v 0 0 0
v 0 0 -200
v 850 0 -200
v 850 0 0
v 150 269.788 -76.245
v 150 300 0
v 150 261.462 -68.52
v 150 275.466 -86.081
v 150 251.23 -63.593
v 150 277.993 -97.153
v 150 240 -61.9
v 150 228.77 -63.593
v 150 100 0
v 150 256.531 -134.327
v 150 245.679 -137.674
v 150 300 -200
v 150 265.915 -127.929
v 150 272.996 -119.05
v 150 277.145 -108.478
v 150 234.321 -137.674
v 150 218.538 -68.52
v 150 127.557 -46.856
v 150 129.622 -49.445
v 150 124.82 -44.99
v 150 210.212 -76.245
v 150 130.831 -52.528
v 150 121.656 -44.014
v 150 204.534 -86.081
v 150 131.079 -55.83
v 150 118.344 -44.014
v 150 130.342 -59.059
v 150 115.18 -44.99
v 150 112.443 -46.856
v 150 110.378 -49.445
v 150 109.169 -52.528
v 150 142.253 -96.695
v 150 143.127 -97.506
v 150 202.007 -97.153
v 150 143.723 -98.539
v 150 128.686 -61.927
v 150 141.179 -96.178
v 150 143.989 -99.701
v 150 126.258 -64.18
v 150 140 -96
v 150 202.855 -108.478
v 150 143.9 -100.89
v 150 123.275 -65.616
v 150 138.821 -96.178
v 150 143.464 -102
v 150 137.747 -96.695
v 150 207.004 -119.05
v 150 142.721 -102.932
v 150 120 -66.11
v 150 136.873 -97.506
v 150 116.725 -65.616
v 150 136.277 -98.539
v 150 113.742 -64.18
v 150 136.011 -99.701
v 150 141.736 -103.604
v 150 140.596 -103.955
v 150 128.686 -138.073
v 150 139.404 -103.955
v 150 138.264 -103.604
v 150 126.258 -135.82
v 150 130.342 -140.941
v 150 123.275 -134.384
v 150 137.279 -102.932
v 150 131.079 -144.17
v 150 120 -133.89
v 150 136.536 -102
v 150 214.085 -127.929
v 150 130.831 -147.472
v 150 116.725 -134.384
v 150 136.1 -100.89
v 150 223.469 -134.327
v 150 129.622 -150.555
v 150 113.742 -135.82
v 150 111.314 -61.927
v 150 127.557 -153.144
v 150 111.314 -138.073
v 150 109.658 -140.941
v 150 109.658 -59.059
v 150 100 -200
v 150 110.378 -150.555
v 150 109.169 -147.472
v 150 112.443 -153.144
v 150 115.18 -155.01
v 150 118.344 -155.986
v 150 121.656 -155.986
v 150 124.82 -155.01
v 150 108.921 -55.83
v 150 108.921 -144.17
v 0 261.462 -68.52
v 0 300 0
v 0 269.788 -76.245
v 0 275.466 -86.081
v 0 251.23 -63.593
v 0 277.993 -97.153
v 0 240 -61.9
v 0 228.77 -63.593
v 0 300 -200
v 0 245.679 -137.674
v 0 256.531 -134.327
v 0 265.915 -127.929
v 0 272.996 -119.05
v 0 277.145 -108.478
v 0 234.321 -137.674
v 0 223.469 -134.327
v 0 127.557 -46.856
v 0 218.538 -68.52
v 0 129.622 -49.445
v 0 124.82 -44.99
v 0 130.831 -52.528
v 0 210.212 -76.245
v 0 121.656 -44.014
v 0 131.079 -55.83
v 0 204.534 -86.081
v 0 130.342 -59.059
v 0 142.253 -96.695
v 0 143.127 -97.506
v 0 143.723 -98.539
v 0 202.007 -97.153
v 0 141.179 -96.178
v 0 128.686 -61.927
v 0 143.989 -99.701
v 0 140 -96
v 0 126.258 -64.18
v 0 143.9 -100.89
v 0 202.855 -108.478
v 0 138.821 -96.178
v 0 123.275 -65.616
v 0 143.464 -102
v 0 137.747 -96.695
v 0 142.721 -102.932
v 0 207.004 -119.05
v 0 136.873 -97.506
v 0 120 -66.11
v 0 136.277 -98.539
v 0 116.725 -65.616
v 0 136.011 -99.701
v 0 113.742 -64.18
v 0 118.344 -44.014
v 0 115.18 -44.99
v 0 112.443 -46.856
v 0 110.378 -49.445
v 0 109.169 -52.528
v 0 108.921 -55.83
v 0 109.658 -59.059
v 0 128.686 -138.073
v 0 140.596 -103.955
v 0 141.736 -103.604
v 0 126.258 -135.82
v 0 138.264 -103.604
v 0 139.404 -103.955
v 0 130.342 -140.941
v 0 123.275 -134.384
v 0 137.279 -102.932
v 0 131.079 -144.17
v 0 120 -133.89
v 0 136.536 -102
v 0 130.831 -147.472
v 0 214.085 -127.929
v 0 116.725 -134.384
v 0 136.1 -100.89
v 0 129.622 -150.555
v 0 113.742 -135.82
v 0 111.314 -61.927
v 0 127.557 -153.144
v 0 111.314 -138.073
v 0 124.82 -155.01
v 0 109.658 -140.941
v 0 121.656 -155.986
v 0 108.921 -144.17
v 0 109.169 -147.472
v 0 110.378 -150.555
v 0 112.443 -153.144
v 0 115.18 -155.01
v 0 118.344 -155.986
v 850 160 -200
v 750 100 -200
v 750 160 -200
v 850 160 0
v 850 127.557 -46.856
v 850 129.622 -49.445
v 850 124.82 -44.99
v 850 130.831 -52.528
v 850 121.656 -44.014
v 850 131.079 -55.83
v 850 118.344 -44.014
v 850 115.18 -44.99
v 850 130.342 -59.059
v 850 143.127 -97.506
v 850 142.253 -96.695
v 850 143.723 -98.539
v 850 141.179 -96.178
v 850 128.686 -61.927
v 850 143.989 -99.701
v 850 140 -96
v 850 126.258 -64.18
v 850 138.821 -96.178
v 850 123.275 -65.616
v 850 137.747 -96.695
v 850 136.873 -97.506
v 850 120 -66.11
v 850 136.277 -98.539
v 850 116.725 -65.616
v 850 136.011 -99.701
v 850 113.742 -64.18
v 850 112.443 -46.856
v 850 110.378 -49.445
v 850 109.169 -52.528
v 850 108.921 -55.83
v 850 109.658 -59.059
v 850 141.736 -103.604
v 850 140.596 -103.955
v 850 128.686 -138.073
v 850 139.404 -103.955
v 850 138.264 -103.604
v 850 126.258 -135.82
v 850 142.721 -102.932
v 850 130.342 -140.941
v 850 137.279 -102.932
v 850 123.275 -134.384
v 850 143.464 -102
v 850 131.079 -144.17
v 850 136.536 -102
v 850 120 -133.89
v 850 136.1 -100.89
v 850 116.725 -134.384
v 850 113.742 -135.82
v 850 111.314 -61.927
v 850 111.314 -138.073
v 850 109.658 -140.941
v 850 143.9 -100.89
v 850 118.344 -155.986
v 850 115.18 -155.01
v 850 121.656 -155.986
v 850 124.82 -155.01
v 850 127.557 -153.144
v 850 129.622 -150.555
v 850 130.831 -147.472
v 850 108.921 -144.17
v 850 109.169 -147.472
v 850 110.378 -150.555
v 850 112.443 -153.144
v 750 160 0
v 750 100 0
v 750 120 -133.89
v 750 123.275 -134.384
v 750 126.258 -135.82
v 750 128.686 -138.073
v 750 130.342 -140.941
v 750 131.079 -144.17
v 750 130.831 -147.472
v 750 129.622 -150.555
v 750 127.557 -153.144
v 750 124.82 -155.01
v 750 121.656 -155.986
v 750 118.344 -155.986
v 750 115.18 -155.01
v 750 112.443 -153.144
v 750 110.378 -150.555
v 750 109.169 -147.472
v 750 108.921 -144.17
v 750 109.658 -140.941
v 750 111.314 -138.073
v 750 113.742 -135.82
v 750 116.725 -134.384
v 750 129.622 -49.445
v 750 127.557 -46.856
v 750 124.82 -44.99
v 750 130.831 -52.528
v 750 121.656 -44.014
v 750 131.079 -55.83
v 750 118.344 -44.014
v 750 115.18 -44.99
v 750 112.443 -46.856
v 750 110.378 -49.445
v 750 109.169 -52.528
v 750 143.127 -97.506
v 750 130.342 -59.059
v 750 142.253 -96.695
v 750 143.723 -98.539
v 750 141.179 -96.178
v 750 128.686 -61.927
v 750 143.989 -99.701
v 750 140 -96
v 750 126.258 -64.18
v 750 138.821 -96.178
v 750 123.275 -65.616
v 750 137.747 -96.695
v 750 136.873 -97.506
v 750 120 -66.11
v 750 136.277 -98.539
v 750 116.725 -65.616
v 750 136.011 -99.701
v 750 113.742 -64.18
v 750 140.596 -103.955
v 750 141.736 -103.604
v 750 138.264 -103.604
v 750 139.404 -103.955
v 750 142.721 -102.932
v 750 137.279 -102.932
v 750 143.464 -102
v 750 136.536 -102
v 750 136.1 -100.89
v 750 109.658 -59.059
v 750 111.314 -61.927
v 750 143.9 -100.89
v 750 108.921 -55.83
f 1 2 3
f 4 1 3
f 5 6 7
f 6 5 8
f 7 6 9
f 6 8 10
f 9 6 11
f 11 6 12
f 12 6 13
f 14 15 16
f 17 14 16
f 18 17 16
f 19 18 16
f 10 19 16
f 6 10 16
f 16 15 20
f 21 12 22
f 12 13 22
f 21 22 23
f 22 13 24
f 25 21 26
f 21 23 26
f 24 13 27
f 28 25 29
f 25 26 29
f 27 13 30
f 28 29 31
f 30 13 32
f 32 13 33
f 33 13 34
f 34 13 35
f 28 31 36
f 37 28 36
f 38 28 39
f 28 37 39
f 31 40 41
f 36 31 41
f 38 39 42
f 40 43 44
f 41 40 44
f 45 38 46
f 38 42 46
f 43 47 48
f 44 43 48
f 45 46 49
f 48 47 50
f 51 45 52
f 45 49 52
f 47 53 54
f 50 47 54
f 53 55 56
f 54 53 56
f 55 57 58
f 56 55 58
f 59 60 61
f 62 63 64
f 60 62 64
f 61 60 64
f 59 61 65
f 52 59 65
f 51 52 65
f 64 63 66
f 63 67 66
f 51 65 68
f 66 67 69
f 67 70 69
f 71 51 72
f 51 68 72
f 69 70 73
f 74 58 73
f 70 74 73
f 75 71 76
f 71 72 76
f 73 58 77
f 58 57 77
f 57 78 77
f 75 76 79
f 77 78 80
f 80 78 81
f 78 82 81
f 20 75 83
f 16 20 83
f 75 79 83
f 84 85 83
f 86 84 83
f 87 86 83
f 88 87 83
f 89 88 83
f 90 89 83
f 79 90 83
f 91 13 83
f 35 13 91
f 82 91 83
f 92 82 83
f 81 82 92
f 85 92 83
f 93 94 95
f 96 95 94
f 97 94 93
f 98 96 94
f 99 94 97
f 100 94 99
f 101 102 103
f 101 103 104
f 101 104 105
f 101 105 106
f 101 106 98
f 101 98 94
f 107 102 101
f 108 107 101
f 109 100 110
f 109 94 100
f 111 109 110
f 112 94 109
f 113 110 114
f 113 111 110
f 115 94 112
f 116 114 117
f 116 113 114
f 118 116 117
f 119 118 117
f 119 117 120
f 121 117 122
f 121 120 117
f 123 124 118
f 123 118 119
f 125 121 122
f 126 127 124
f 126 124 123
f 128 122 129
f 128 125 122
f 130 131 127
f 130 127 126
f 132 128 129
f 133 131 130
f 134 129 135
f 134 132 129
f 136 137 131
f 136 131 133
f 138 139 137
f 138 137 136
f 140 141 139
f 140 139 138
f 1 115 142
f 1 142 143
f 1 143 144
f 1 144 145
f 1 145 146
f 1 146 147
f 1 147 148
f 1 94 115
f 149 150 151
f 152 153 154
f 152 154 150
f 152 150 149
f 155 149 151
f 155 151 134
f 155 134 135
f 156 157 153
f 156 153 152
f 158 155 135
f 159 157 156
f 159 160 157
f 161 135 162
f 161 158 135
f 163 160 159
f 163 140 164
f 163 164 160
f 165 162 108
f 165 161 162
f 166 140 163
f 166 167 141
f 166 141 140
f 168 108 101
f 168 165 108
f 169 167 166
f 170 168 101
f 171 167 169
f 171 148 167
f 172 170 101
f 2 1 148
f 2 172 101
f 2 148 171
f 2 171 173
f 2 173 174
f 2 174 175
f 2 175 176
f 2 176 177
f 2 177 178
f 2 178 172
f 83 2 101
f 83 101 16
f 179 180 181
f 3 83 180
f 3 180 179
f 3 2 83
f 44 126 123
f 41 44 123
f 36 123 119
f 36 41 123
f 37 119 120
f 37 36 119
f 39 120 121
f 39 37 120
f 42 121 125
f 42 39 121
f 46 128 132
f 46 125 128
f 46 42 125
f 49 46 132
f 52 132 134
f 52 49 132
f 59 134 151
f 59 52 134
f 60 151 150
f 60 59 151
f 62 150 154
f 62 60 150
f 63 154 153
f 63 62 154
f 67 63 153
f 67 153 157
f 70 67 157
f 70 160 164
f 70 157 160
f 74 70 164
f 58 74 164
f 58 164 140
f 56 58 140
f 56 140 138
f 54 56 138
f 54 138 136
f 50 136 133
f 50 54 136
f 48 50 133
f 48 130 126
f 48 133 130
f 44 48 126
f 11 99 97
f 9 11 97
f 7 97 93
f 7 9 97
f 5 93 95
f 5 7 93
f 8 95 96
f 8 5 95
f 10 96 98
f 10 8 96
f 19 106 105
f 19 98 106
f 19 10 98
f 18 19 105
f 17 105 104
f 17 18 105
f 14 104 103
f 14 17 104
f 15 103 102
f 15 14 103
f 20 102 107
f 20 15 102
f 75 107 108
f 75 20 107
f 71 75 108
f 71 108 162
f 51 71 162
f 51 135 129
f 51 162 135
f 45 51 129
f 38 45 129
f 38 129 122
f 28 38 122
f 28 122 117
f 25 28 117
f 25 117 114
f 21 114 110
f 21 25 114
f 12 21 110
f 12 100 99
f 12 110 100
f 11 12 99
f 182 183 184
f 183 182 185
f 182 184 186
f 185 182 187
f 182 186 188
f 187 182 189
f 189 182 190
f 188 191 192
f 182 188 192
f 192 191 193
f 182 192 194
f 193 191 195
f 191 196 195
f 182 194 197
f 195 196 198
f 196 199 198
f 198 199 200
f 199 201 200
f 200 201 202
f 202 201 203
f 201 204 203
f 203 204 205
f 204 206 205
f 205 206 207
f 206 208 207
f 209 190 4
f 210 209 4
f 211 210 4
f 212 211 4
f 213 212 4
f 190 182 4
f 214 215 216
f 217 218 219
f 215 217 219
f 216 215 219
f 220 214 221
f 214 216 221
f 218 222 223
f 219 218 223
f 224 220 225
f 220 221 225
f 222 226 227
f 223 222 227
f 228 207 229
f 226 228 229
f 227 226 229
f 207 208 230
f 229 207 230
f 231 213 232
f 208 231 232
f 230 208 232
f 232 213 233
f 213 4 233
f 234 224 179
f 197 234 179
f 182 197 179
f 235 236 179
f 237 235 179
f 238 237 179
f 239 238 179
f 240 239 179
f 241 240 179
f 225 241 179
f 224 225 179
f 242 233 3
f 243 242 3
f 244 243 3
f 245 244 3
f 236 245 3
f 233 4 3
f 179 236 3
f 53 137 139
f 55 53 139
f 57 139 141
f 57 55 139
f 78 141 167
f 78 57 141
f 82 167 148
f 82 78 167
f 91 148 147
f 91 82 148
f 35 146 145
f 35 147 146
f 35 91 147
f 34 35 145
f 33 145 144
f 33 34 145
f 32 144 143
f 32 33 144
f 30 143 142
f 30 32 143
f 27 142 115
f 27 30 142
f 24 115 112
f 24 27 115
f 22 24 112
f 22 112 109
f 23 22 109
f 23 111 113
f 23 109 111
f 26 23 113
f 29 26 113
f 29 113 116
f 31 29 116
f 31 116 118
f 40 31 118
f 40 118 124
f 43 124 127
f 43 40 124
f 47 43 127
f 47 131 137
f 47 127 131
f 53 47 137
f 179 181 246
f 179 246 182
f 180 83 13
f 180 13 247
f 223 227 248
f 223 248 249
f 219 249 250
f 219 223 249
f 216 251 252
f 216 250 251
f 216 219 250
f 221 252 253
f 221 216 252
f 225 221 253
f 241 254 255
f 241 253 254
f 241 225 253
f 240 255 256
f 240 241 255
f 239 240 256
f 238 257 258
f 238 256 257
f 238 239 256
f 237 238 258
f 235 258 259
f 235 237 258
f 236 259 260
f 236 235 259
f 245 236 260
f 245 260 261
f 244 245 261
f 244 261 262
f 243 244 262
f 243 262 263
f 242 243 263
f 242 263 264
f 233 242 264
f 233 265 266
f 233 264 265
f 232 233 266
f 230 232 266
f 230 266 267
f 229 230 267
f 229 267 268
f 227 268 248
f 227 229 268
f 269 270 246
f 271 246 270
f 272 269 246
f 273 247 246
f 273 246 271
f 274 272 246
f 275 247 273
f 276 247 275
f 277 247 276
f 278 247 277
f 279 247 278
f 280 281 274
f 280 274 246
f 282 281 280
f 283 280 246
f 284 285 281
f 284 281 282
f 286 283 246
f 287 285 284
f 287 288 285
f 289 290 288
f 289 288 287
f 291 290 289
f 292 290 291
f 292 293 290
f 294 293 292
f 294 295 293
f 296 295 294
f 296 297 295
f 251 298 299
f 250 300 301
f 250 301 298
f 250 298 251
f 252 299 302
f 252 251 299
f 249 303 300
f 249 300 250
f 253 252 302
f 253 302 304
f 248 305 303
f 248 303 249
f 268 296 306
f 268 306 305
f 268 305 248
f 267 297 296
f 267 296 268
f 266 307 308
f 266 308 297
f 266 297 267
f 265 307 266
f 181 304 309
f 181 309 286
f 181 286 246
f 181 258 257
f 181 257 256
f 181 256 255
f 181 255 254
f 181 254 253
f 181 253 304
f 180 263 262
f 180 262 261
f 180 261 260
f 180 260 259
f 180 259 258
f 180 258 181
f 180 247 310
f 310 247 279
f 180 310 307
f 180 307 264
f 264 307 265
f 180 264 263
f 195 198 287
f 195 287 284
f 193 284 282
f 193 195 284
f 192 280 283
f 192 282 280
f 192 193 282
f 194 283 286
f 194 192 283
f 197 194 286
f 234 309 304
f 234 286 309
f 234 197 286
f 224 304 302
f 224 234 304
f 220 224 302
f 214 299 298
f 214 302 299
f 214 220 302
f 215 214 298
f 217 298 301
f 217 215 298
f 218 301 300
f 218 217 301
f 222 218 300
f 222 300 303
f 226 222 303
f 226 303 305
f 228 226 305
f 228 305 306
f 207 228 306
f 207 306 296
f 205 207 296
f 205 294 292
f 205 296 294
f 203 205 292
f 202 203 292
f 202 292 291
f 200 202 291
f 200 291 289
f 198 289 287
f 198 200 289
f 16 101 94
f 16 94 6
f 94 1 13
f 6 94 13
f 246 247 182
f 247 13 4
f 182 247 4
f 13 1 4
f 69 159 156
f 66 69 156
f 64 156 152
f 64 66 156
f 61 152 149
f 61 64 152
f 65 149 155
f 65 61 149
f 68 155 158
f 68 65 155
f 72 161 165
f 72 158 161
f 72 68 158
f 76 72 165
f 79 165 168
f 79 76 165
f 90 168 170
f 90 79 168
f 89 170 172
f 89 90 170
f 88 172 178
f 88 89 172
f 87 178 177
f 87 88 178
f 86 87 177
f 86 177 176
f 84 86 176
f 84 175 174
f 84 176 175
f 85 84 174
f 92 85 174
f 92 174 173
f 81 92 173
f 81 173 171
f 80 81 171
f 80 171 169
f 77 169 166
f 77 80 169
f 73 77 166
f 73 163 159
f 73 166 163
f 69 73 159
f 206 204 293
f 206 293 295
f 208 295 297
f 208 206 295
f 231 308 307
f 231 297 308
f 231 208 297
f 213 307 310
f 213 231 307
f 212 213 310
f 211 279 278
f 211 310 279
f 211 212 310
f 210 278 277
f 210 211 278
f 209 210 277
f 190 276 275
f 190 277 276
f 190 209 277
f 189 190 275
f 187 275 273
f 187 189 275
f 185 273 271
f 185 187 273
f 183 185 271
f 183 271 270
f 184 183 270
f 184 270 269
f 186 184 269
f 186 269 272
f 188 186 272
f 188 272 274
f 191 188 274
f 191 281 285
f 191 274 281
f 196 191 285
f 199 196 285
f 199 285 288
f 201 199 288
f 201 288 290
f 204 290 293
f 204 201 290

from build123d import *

# Parameters (mm, degrees)
SKETCH1_W               = 850
SKETCH1_H               = 200
BOSS_EXTRUDE1_DEPTH     = 100
SKETCH2_W               = 150
SKETCH2_H               = 200
BOSS_EXTRUDE2_DEPTH     = 200
SKETCH4_W               = 100
SKETCH4_H               = 200
BOSS_EXTRUDE3_DEPTH     = 60
CUT_EXTRUDE1_DEPTH      = 924.309265631
CUT_EXTRUDE1_DEPTH_BACK = 924.309265631
SKETCH3_R               = 38.1
SKETCH3_R_2             = 11.11
SKETCH3_R_3             = 4


with BuildPart() as part:
    # Sketch1 → Boss-Extrude1 (new body)
    with BuildSketch(Plane(origin=(0, 0, 0), x_dir=(1, 0, 0), z_dir=(0, 1, 0))):
        with Locations((425, 100)):
            Rectangle(SKETCH1_W, SKETCH1_H)
    extrude(amount=BOSS_EXTRUDE1_DEPTH)

    # Sketch2 → Boss-Extrude2 (add)
    with BuildSketch(Plane(origin=(0, 100, 0), x_dir=(1, 0, 0), z_dir=(0, 1, 0))):
        with Locations((75, 100)):
            Rectangle(SKETCH2_W, SKETCH2_H)
    extrude(amount=BOSS_EXTRUDE2_DEPTH)

    # Sketch4 → Boss-Extrude3 (add)
    with BuildSketch(Plane(origin=(0, 100, 0), x_dir=(1, 0, 0), z_dir=(0, 1, 0))):
        with Locations((800, 100)):
            Rectangle(SKETCH4_W, SKETCH4_H)
    extrude(amount=BOSS_EXTRUDE3_DEPTH)

    # Sketch3 → Cut-Extrude1 (cut, two sides: drawn at the far end of the back side and taken through both)
    with BuildSketch(Plane.ZY.offset(-CUT_EXTRUDE1_DEPTH_BACK)):
        with Locations((-100, 240)):
            Circle(SKETCH3_R)
        with Locations((-145, 120)):
            Circle(SKETCH3_R_2)
        with Locations(Location((-55, 120, 0), (0, 0, 180))):
            Circle(SKETCH3_R_2)
        with Locations((-100, 140)):
            Circle(SKETCH3_R_3)
    extrude(amount=CUT_EXTRUDE1_DEPTH + CUT_EXTRUDE1_DEPTH_BACK, mode=Mode.SUBTRACT)


solid = part.part
